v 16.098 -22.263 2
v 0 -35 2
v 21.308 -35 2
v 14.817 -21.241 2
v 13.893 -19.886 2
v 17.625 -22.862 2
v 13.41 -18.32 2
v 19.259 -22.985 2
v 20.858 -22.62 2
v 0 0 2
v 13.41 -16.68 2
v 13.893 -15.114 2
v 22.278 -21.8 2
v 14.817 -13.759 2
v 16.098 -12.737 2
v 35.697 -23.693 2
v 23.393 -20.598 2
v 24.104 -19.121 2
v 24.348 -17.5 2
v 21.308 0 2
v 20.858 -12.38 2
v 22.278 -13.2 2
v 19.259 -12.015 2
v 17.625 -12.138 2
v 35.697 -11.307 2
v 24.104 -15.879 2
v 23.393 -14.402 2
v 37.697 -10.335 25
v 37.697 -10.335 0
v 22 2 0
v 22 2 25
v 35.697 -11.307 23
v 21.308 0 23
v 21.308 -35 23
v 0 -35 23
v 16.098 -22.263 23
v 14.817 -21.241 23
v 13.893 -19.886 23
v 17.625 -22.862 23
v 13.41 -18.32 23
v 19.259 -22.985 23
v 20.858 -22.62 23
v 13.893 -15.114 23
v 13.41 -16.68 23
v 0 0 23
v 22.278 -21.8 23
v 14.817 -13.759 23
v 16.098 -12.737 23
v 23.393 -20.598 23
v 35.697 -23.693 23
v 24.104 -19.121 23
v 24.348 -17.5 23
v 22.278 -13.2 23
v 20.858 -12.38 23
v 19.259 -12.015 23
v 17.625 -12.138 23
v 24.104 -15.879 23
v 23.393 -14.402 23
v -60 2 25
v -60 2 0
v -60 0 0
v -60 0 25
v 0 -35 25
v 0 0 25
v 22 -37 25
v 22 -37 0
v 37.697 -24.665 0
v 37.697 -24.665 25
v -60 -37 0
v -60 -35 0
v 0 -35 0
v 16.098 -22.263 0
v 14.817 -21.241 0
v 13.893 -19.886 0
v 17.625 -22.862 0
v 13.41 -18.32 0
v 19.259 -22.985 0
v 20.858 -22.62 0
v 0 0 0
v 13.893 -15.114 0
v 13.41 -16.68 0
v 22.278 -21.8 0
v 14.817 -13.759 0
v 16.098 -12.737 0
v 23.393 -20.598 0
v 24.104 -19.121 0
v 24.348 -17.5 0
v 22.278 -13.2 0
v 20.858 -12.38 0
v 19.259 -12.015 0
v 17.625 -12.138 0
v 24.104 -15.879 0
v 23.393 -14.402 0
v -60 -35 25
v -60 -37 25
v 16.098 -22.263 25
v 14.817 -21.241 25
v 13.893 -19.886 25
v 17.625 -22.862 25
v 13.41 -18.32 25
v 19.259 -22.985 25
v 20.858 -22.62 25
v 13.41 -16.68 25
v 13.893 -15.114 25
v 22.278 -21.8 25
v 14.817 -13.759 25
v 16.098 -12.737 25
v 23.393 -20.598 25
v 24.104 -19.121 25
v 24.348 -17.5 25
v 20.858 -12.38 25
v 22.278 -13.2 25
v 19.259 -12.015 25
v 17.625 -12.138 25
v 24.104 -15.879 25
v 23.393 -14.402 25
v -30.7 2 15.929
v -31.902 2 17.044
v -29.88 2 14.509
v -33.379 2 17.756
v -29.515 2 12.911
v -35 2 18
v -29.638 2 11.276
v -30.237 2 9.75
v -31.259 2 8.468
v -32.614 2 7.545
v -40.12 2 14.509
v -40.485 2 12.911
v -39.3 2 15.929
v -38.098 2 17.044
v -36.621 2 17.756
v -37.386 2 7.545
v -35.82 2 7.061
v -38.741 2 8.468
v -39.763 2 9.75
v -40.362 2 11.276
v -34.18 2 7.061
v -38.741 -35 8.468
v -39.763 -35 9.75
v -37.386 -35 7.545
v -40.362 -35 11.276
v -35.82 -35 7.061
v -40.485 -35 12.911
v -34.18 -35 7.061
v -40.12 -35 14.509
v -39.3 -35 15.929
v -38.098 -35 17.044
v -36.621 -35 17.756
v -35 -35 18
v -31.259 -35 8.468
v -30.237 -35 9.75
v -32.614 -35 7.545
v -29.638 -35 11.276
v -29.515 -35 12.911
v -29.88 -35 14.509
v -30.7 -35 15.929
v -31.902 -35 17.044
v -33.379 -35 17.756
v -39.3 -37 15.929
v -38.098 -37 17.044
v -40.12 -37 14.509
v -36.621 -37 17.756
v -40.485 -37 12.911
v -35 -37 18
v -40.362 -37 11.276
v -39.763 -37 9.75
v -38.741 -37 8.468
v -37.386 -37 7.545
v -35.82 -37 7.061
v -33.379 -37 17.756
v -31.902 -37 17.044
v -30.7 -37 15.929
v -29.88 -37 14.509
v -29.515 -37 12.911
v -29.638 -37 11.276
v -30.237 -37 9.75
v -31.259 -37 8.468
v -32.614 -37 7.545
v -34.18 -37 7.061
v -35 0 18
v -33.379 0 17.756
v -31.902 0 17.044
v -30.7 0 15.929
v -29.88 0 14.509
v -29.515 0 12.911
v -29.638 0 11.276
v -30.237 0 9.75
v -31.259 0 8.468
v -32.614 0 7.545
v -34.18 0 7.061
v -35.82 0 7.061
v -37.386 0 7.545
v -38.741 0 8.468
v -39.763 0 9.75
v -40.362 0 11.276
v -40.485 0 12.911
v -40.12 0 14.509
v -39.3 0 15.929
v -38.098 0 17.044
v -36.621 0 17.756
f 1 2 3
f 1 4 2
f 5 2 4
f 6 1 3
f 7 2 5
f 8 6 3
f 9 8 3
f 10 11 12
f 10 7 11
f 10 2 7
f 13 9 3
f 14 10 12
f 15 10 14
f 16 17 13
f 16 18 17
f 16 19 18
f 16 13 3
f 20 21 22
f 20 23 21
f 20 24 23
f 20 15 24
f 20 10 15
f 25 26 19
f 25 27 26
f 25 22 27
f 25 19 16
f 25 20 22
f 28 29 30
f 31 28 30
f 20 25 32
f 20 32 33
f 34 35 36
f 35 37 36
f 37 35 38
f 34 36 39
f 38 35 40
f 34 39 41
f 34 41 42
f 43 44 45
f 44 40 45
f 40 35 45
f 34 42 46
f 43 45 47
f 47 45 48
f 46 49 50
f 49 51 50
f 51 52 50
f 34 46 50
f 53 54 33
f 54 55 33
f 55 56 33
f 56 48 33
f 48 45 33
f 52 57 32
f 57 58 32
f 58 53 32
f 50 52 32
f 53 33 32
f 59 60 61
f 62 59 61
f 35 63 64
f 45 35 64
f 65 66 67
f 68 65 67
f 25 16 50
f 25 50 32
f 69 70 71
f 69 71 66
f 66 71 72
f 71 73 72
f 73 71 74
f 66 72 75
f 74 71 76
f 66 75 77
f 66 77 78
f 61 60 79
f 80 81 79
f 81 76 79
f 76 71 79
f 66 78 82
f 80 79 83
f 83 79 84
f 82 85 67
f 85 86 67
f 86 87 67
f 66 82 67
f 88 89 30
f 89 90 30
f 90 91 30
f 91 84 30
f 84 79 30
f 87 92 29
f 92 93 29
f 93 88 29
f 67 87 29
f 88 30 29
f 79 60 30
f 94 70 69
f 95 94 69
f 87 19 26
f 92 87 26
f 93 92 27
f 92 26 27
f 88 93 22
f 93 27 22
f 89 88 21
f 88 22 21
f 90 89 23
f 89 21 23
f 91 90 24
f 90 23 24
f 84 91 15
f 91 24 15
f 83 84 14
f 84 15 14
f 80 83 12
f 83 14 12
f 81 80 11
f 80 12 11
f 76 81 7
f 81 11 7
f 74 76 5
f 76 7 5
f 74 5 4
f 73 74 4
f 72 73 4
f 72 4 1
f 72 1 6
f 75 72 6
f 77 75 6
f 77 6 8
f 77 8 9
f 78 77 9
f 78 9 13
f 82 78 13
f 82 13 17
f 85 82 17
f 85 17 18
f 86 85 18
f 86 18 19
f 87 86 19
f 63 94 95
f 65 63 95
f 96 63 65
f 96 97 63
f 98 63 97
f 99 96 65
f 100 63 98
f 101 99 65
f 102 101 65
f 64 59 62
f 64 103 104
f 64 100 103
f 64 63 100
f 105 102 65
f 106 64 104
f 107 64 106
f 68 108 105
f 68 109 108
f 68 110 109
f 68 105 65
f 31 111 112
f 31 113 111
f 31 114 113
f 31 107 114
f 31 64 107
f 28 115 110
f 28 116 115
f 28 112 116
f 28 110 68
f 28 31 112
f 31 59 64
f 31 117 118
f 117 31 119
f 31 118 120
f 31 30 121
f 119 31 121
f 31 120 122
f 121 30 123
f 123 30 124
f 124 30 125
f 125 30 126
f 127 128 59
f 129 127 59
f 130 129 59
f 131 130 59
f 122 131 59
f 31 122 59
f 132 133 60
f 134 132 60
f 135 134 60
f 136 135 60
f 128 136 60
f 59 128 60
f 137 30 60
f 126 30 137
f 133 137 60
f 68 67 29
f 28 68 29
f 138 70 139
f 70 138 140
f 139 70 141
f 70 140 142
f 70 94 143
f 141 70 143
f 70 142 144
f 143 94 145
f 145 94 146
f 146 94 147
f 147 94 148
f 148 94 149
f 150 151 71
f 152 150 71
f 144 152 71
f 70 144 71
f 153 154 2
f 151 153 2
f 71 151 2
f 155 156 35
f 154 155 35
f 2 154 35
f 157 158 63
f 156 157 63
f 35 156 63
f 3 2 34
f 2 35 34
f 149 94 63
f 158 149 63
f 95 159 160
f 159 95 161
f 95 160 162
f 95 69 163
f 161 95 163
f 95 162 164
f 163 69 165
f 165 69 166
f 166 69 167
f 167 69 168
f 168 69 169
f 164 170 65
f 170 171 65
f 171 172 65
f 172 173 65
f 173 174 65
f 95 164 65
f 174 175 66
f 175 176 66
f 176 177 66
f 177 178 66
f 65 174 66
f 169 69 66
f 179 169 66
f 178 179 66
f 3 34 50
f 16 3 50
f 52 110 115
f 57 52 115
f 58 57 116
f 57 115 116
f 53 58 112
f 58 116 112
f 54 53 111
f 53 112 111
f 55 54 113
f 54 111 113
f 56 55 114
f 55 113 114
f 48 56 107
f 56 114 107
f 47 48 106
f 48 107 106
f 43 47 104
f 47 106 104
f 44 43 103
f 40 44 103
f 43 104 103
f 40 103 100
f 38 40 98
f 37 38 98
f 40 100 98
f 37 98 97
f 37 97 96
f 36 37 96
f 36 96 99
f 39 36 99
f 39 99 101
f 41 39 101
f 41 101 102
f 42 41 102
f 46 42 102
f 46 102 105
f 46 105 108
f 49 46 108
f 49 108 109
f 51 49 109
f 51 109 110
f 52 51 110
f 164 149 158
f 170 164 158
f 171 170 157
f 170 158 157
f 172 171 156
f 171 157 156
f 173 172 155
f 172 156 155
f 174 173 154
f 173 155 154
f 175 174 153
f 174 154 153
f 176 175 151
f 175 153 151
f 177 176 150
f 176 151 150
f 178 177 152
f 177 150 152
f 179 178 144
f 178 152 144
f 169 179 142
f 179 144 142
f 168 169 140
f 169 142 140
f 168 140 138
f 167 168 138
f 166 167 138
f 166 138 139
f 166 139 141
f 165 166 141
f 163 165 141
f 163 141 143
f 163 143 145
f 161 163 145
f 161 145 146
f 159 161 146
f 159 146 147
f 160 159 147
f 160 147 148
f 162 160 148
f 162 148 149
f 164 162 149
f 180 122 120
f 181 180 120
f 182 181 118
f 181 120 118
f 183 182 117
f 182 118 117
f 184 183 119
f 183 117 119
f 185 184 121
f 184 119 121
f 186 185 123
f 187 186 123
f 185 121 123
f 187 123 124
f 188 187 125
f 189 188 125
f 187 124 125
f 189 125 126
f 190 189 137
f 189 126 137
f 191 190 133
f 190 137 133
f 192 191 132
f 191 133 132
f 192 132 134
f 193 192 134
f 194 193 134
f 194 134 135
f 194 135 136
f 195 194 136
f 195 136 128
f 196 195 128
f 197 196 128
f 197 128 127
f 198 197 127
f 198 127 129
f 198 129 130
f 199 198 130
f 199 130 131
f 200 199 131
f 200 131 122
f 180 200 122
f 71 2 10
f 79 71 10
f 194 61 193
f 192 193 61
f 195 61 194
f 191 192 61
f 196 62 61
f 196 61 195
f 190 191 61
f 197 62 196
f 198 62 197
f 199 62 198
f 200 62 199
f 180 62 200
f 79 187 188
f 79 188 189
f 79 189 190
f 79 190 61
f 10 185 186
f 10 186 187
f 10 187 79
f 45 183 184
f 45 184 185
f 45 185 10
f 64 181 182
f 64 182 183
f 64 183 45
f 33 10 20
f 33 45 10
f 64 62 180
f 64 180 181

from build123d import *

# Parameters (mm, degrees)
RESSALTO_EXTRUS_O2_DEPTH = 25
ESBO_O6_W                = 60
ESBO_O6_H                = 35
CORTE_EXTRUS_O4_DEPTH    = 25
ESBO_O7_R                = 5.5
CORTE_EXTRUS_O5_DEPTH    = 67
CASCA3_START             = 2
CASCA3_DEPTH             = 21
CORTE_EXTRUS_O7_DEPTH    = 67


# Read off the part's stored shape, not the designer's step: Casca3
with BuildPart() as part:
    # Esboço1 → Ressalto-extrusão2 (new body)
    with BuildSketch(Plane.XY):
        Polygon((-60, 2), (-60, 0), (-60, -35), (-60, -37), (2, -37), (22, -37), (37.696905261, -24.665320756), (37.696905261, -10.334679244), (22, 2), (2, 2), align=None)
    extrude(amount=RESSALTO_EXTRUS_O2_DEPTH)

    # Esboço6 → Corte-extrusão4 (cut)
    with BuildSketch(Plane.XY.offset(25)):
        with Locations((-30, -17.5)):
            Rectangle(ESBO_O6_W, ESBO_O6_H)
    extrude(amount=-CORTE_EXTRUS_O4_DEPTH, mode=Mode.SUBTRACT)

    # Esboço7 → Corte-extrusão5 (cut)
    with BuildSketch(Plane(origin=(0, 2, 0), x_dir=(1, 0, 0), z_dir=(0, 1, 0))):
        with Locations(Location((-35, -12.5, 0), (0, 0, 270))):
            Circle(ESBO_O7_R)
    extrude(amount=-CORTE_EXTRUS_O5_DEPTH, mode=Mode.SUBTRACT)

    # Casca3 outline → Casca3 (cut)
    with BuildSketch(Plane.XY.offset(CASCA3_START)):
        Polygon((0, -35), (21.308212264, -35), (35.696905261, -23.693318211), (35.696905261, -11.306681789), (21.308212264, 0), (0, 0), align=None)
    extrude(amount=CASCA3_DEPTH, mode=Mode.SUBTRACT)

    # Esboço8 → Corte-extrusão7 (cut)
    with BuildSketch(Plane.XY.offset(25)):
        with BuildLine():
            ThreePointArc((13.34845263, -17.5), (18.84845263, -23), (24.34845263, -17.5))
            Line((24.34845263, -17.5), (13.34845263, -17.5))
        make_face()
        with BuildLine():
            Line((13.34845263, -17.5), (24.34845263, -17.5))
            ThreePointArc((24.34845263, -17.5), (18.84845263, -12), (13.34845263, -17.5))
        make_face()
    extrude(amount=-CORTE_EXTRUS_O7_DEPTH, mode=Mode.SUBTRACT)


solid = part.part
